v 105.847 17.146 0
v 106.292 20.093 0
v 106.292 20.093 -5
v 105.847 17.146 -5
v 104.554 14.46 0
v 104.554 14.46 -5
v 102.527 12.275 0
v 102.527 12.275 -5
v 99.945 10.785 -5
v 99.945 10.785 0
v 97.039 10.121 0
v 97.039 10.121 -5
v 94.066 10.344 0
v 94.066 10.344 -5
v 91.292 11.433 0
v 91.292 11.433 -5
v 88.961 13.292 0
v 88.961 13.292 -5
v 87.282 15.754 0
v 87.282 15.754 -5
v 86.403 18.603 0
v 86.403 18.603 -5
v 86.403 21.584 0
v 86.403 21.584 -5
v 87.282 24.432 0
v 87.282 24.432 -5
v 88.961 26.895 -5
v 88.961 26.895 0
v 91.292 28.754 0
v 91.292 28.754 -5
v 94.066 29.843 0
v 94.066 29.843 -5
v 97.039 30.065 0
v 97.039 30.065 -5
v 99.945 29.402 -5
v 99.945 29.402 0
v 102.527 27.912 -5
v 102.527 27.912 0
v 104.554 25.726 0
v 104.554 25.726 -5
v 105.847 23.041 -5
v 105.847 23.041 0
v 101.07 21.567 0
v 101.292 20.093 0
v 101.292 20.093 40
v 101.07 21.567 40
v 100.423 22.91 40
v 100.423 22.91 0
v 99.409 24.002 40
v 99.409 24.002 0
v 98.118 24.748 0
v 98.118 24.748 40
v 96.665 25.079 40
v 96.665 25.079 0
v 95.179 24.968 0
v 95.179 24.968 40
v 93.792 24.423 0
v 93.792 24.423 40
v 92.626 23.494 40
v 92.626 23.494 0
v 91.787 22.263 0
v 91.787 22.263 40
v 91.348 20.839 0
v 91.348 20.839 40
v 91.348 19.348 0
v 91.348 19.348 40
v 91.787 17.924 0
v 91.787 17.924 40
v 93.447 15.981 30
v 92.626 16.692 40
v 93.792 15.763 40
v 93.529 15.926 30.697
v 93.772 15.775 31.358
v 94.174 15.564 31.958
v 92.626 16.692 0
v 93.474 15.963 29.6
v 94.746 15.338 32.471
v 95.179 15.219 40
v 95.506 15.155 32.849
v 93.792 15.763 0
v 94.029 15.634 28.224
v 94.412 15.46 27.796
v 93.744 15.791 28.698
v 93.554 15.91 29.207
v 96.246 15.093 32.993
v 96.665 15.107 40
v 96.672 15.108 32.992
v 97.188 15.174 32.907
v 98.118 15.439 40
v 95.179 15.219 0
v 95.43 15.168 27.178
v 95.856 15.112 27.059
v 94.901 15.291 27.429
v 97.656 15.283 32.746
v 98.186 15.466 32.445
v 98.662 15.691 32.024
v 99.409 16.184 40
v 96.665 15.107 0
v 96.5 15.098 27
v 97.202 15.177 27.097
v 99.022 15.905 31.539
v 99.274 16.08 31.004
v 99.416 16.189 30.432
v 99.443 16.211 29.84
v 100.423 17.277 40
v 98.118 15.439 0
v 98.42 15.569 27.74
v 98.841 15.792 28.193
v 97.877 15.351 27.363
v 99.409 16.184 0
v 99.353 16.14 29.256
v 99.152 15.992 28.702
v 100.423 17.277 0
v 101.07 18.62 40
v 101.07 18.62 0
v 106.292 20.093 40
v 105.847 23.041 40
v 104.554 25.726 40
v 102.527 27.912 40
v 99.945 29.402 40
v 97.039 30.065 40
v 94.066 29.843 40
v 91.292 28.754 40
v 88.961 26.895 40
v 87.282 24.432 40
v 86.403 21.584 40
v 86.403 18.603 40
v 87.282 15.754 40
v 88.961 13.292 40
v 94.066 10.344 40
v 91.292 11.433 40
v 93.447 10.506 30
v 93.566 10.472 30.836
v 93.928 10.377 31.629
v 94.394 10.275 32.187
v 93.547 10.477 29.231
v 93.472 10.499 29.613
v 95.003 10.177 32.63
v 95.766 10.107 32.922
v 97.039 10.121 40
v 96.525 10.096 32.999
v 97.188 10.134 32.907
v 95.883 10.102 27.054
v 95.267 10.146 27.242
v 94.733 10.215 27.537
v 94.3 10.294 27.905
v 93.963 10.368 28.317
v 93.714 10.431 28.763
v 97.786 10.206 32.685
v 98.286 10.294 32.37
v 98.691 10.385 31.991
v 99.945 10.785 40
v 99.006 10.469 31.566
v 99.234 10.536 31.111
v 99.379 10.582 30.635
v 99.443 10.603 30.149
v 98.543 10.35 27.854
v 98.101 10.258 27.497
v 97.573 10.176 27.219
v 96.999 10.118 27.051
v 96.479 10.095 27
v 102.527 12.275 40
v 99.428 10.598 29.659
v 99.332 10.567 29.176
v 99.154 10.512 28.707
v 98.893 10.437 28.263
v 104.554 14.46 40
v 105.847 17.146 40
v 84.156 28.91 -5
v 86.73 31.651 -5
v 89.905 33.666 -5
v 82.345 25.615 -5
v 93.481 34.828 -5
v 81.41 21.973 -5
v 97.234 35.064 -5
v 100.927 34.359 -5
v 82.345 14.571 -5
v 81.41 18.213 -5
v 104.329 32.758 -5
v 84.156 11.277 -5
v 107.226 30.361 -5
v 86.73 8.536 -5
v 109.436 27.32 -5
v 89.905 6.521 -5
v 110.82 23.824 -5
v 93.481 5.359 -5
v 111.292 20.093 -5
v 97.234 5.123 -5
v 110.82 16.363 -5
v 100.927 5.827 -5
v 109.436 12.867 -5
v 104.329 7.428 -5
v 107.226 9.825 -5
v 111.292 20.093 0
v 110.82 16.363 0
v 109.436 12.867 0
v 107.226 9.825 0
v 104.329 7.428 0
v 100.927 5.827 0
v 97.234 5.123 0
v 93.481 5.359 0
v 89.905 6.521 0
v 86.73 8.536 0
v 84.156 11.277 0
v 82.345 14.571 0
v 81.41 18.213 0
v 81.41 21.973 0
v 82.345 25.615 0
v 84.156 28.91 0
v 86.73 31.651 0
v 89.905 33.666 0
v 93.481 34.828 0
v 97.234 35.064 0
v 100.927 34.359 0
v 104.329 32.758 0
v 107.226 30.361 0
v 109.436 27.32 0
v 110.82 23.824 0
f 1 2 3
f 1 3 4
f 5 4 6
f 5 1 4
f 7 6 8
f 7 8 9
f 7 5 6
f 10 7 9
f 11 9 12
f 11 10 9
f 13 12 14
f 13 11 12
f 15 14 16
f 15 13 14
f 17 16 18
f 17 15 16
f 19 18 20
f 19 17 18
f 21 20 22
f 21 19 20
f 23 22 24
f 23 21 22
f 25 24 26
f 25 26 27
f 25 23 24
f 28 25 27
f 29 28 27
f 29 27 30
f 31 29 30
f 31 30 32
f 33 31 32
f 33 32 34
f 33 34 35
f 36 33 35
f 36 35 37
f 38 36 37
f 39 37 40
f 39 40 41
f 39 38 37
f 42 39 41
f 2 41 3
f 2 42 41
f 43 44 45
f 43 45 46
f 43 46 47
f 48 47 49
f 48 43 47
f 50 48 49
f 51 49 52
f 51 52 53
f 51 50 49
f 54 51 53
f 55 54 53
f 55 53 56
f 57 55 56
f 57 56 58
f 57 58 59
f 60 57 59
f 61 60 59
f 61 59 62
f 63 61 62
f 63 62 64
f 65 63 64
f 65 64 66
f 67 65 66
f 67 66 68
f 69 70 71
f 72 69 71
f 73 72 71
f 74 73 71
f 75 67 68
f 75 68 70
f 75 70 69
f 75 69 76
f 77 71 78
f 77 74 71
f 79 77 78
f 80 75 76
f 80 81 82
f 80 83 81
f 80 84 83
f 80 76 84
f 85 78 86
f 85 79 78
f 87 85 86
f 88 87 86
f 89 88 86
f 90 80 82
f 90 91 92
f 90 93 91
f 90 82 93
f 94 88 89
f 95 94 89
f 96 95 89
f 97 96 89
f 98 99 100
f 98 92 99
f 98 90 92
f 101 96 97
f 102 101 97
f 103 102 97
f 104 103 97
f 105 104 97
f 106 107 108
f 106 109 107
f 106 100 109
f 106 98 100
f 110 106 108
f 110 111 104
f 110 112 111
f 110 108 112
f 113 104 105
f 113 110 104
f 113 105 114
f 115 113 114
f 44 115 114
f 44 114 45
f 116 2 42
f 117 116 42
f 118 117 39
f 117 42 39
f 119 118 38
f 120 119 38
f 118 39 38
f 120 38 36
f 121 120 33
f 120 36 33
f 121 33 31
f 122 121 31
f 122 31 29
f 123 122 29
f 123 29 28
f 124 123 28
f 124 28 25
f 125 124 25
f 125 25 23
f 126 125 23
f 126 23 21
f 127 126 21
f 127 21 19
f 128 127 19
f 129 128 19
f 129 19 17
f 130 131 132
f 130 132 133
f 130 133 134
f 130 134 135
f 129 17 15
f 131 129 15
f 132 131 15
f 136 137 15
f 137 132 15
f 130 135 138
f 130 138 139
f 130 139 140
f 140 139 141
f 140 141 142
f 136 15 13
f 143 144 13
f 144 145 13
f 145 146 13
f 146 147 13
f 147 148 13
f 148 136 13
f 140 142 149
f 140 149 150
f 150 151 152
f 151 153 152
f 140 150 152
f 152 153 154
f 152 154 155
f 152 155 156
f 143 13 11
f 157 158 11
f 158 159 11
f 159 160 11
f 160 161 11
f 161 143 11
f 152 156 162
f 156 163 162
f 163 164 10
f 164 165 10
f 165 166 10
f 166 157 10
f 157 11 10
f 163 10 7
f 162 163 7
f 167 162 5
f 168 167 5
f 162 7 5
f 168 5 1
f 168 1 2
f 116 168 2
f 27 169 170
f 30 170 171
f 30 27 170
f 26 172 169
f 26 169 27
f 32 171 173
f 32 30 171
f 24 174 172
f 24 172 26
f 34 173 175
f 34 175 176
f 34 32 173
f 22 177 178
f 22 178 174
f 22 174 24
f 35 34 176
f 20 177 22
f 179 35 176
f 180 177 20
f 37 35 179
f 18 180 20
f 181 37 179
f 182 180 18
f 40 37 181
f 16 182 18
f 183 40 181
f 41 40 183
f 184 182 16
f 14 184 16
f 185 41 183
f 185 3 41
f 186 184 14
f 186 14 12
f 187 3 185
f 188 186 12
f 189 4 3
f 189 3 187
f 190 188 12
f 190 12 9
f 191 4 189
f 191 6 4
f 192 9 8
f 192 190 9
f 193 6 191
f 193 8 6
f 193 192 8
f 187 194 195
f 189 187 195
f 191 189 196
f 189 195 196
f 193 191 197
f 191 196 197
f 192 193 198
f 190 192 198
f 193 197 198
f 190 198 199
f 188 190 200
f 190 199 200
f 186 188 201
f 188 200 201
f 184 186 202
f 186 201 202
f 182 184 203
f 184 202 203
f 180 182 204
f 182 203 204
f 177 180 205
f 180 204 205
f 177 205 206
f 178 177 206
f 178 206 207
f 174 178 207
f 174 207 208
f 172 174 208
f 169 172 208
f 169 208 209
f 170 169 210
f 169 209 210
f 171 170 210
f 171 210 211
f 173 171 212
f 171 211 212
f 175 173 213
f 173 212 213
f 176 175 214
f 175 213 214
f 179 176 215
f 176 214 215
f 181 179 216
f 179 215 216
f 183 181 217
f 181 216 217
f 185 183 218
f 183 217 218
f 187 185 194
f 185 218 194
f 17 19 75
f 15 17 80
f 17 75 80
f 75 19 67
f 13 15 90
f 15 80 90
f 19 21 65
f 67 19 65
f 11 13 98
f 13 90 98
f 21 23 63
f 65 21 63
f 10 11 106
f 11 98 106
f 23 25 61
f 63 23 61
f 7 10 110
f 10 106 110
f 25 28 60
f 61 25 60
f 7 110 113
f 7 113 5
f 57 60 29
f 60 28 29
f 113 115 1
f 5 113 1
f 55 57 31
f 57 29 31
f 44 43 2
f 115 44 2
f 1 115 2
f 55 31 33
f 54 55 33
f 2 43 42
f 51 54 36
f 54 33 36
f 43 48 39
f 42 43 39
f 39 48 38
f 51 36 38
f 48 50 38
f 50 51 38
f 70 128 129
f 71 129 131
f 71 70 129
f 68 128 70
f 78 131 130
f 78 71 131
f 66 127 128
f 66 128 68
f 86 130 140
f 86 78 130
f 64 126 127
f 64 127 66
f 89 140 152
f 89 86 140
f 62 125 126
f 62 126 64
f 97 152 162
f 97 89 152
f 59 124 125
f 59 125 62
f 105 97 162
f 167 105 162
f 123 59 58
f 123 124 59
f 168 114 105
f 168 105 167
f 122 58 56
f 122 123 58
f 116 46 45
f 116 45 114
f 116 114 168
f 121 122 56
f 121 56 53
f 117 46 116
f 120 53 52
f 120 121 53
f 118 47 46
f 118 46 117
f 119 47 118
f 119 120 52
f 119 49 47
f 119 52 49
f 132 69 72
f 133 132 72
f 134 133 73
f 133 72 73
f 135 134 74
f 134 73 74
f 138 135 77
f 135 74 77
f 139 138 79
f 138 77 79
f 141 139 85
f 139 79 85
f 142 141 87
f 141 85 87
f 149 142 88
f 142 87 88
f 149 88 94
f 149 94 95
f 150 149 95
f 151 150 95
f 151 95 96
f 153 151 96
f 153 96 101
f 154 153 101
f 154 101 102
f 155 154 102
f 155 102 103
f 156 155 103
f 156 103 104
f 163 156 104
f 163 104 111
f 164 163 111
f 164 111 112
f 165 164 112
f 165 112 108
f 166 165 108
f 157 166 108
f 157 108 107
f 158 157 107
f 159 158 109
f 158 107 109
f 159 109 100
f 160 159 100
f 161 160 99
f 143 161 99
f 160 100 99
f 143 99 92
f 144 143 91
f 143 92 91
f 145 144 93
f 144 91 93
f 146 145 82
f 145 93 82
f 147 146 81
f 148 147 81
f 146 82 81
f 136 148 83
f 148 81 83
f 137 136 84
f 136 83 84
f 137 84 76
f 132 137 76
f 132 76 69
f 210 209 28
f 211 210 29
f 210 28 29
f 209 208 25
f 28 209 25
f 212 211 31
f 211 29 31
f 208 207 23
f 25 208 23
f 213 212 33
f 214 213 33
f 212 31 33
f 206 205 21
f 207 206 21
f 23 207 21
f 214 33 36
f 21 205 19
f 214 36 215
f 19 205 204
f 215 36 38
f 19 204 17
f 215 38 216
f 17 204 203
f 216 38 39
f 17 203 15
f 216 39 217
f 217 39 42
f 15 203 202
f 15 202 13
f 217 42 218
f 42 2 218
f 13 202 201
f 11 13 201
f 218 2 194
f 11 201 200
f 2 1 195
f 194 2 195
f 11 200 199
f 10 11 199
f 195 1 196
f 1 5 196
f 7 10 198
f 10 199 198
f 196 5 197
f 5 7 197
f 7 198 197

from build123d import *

# Parameters (mm, degrees)
F0_R     = 10
F0_R_2   = 5
F1_DEPTH = 40
F3_D     = 6
F3_DEPTH = 12
F3_START = 10.6041218
F3_TIP   = 1.8025818571
F4_R     = 15
F4_R_2   = 10
F5_DEPTH = 5


with BuildPart() as f1:
    # F0 (on Top) → F1 (new body)
    with BuildSketch(Plane.XY):
        with Locations((96.2916985154, 20.0932901353)):
            Circle(F0_R)
        with Locations((96.2916985154, 20.0932901353)):
            Circle(F0_R_2, mode=Mode.SUBTRACT)
    extrude(amount=F1_DEPTH)

    # F3
    # its depths count from where the whole tool has entered the part; down to there all is cleared
    with Locations(Plane.XZ.offset(-F3_START)):
        with Locations((96.4469611645, 30)):
            Hole(F3_D / 2, depth=F3_DEPTH)
            with Locations((0, 0, -(F3_DEPTH + F3_TIP / 2))):  # 118° drill point
                Cone(0, F3_D / 2, F3_TIP, mode=Mode.SUBTRACT)


with BuildPart() as f5:
    # F4 (on face) → F5 (new body)
    with BuildSketch(Plane(origin=(0, 0, 0), x_dir=(1, 0, 0), z_dir=(0, 0, -1))):
        with Locations((96.2916985154, -20.0932901353)):
            Circle(F4_R)
        with Locations((96.2916985154, -20.0932901353)):
            Circle(F4_R_2, mode=Mode.SUBTRACT)
    extrude(amount=F5_DEPTH)


solid = Compound([f1.part, f5.part])
